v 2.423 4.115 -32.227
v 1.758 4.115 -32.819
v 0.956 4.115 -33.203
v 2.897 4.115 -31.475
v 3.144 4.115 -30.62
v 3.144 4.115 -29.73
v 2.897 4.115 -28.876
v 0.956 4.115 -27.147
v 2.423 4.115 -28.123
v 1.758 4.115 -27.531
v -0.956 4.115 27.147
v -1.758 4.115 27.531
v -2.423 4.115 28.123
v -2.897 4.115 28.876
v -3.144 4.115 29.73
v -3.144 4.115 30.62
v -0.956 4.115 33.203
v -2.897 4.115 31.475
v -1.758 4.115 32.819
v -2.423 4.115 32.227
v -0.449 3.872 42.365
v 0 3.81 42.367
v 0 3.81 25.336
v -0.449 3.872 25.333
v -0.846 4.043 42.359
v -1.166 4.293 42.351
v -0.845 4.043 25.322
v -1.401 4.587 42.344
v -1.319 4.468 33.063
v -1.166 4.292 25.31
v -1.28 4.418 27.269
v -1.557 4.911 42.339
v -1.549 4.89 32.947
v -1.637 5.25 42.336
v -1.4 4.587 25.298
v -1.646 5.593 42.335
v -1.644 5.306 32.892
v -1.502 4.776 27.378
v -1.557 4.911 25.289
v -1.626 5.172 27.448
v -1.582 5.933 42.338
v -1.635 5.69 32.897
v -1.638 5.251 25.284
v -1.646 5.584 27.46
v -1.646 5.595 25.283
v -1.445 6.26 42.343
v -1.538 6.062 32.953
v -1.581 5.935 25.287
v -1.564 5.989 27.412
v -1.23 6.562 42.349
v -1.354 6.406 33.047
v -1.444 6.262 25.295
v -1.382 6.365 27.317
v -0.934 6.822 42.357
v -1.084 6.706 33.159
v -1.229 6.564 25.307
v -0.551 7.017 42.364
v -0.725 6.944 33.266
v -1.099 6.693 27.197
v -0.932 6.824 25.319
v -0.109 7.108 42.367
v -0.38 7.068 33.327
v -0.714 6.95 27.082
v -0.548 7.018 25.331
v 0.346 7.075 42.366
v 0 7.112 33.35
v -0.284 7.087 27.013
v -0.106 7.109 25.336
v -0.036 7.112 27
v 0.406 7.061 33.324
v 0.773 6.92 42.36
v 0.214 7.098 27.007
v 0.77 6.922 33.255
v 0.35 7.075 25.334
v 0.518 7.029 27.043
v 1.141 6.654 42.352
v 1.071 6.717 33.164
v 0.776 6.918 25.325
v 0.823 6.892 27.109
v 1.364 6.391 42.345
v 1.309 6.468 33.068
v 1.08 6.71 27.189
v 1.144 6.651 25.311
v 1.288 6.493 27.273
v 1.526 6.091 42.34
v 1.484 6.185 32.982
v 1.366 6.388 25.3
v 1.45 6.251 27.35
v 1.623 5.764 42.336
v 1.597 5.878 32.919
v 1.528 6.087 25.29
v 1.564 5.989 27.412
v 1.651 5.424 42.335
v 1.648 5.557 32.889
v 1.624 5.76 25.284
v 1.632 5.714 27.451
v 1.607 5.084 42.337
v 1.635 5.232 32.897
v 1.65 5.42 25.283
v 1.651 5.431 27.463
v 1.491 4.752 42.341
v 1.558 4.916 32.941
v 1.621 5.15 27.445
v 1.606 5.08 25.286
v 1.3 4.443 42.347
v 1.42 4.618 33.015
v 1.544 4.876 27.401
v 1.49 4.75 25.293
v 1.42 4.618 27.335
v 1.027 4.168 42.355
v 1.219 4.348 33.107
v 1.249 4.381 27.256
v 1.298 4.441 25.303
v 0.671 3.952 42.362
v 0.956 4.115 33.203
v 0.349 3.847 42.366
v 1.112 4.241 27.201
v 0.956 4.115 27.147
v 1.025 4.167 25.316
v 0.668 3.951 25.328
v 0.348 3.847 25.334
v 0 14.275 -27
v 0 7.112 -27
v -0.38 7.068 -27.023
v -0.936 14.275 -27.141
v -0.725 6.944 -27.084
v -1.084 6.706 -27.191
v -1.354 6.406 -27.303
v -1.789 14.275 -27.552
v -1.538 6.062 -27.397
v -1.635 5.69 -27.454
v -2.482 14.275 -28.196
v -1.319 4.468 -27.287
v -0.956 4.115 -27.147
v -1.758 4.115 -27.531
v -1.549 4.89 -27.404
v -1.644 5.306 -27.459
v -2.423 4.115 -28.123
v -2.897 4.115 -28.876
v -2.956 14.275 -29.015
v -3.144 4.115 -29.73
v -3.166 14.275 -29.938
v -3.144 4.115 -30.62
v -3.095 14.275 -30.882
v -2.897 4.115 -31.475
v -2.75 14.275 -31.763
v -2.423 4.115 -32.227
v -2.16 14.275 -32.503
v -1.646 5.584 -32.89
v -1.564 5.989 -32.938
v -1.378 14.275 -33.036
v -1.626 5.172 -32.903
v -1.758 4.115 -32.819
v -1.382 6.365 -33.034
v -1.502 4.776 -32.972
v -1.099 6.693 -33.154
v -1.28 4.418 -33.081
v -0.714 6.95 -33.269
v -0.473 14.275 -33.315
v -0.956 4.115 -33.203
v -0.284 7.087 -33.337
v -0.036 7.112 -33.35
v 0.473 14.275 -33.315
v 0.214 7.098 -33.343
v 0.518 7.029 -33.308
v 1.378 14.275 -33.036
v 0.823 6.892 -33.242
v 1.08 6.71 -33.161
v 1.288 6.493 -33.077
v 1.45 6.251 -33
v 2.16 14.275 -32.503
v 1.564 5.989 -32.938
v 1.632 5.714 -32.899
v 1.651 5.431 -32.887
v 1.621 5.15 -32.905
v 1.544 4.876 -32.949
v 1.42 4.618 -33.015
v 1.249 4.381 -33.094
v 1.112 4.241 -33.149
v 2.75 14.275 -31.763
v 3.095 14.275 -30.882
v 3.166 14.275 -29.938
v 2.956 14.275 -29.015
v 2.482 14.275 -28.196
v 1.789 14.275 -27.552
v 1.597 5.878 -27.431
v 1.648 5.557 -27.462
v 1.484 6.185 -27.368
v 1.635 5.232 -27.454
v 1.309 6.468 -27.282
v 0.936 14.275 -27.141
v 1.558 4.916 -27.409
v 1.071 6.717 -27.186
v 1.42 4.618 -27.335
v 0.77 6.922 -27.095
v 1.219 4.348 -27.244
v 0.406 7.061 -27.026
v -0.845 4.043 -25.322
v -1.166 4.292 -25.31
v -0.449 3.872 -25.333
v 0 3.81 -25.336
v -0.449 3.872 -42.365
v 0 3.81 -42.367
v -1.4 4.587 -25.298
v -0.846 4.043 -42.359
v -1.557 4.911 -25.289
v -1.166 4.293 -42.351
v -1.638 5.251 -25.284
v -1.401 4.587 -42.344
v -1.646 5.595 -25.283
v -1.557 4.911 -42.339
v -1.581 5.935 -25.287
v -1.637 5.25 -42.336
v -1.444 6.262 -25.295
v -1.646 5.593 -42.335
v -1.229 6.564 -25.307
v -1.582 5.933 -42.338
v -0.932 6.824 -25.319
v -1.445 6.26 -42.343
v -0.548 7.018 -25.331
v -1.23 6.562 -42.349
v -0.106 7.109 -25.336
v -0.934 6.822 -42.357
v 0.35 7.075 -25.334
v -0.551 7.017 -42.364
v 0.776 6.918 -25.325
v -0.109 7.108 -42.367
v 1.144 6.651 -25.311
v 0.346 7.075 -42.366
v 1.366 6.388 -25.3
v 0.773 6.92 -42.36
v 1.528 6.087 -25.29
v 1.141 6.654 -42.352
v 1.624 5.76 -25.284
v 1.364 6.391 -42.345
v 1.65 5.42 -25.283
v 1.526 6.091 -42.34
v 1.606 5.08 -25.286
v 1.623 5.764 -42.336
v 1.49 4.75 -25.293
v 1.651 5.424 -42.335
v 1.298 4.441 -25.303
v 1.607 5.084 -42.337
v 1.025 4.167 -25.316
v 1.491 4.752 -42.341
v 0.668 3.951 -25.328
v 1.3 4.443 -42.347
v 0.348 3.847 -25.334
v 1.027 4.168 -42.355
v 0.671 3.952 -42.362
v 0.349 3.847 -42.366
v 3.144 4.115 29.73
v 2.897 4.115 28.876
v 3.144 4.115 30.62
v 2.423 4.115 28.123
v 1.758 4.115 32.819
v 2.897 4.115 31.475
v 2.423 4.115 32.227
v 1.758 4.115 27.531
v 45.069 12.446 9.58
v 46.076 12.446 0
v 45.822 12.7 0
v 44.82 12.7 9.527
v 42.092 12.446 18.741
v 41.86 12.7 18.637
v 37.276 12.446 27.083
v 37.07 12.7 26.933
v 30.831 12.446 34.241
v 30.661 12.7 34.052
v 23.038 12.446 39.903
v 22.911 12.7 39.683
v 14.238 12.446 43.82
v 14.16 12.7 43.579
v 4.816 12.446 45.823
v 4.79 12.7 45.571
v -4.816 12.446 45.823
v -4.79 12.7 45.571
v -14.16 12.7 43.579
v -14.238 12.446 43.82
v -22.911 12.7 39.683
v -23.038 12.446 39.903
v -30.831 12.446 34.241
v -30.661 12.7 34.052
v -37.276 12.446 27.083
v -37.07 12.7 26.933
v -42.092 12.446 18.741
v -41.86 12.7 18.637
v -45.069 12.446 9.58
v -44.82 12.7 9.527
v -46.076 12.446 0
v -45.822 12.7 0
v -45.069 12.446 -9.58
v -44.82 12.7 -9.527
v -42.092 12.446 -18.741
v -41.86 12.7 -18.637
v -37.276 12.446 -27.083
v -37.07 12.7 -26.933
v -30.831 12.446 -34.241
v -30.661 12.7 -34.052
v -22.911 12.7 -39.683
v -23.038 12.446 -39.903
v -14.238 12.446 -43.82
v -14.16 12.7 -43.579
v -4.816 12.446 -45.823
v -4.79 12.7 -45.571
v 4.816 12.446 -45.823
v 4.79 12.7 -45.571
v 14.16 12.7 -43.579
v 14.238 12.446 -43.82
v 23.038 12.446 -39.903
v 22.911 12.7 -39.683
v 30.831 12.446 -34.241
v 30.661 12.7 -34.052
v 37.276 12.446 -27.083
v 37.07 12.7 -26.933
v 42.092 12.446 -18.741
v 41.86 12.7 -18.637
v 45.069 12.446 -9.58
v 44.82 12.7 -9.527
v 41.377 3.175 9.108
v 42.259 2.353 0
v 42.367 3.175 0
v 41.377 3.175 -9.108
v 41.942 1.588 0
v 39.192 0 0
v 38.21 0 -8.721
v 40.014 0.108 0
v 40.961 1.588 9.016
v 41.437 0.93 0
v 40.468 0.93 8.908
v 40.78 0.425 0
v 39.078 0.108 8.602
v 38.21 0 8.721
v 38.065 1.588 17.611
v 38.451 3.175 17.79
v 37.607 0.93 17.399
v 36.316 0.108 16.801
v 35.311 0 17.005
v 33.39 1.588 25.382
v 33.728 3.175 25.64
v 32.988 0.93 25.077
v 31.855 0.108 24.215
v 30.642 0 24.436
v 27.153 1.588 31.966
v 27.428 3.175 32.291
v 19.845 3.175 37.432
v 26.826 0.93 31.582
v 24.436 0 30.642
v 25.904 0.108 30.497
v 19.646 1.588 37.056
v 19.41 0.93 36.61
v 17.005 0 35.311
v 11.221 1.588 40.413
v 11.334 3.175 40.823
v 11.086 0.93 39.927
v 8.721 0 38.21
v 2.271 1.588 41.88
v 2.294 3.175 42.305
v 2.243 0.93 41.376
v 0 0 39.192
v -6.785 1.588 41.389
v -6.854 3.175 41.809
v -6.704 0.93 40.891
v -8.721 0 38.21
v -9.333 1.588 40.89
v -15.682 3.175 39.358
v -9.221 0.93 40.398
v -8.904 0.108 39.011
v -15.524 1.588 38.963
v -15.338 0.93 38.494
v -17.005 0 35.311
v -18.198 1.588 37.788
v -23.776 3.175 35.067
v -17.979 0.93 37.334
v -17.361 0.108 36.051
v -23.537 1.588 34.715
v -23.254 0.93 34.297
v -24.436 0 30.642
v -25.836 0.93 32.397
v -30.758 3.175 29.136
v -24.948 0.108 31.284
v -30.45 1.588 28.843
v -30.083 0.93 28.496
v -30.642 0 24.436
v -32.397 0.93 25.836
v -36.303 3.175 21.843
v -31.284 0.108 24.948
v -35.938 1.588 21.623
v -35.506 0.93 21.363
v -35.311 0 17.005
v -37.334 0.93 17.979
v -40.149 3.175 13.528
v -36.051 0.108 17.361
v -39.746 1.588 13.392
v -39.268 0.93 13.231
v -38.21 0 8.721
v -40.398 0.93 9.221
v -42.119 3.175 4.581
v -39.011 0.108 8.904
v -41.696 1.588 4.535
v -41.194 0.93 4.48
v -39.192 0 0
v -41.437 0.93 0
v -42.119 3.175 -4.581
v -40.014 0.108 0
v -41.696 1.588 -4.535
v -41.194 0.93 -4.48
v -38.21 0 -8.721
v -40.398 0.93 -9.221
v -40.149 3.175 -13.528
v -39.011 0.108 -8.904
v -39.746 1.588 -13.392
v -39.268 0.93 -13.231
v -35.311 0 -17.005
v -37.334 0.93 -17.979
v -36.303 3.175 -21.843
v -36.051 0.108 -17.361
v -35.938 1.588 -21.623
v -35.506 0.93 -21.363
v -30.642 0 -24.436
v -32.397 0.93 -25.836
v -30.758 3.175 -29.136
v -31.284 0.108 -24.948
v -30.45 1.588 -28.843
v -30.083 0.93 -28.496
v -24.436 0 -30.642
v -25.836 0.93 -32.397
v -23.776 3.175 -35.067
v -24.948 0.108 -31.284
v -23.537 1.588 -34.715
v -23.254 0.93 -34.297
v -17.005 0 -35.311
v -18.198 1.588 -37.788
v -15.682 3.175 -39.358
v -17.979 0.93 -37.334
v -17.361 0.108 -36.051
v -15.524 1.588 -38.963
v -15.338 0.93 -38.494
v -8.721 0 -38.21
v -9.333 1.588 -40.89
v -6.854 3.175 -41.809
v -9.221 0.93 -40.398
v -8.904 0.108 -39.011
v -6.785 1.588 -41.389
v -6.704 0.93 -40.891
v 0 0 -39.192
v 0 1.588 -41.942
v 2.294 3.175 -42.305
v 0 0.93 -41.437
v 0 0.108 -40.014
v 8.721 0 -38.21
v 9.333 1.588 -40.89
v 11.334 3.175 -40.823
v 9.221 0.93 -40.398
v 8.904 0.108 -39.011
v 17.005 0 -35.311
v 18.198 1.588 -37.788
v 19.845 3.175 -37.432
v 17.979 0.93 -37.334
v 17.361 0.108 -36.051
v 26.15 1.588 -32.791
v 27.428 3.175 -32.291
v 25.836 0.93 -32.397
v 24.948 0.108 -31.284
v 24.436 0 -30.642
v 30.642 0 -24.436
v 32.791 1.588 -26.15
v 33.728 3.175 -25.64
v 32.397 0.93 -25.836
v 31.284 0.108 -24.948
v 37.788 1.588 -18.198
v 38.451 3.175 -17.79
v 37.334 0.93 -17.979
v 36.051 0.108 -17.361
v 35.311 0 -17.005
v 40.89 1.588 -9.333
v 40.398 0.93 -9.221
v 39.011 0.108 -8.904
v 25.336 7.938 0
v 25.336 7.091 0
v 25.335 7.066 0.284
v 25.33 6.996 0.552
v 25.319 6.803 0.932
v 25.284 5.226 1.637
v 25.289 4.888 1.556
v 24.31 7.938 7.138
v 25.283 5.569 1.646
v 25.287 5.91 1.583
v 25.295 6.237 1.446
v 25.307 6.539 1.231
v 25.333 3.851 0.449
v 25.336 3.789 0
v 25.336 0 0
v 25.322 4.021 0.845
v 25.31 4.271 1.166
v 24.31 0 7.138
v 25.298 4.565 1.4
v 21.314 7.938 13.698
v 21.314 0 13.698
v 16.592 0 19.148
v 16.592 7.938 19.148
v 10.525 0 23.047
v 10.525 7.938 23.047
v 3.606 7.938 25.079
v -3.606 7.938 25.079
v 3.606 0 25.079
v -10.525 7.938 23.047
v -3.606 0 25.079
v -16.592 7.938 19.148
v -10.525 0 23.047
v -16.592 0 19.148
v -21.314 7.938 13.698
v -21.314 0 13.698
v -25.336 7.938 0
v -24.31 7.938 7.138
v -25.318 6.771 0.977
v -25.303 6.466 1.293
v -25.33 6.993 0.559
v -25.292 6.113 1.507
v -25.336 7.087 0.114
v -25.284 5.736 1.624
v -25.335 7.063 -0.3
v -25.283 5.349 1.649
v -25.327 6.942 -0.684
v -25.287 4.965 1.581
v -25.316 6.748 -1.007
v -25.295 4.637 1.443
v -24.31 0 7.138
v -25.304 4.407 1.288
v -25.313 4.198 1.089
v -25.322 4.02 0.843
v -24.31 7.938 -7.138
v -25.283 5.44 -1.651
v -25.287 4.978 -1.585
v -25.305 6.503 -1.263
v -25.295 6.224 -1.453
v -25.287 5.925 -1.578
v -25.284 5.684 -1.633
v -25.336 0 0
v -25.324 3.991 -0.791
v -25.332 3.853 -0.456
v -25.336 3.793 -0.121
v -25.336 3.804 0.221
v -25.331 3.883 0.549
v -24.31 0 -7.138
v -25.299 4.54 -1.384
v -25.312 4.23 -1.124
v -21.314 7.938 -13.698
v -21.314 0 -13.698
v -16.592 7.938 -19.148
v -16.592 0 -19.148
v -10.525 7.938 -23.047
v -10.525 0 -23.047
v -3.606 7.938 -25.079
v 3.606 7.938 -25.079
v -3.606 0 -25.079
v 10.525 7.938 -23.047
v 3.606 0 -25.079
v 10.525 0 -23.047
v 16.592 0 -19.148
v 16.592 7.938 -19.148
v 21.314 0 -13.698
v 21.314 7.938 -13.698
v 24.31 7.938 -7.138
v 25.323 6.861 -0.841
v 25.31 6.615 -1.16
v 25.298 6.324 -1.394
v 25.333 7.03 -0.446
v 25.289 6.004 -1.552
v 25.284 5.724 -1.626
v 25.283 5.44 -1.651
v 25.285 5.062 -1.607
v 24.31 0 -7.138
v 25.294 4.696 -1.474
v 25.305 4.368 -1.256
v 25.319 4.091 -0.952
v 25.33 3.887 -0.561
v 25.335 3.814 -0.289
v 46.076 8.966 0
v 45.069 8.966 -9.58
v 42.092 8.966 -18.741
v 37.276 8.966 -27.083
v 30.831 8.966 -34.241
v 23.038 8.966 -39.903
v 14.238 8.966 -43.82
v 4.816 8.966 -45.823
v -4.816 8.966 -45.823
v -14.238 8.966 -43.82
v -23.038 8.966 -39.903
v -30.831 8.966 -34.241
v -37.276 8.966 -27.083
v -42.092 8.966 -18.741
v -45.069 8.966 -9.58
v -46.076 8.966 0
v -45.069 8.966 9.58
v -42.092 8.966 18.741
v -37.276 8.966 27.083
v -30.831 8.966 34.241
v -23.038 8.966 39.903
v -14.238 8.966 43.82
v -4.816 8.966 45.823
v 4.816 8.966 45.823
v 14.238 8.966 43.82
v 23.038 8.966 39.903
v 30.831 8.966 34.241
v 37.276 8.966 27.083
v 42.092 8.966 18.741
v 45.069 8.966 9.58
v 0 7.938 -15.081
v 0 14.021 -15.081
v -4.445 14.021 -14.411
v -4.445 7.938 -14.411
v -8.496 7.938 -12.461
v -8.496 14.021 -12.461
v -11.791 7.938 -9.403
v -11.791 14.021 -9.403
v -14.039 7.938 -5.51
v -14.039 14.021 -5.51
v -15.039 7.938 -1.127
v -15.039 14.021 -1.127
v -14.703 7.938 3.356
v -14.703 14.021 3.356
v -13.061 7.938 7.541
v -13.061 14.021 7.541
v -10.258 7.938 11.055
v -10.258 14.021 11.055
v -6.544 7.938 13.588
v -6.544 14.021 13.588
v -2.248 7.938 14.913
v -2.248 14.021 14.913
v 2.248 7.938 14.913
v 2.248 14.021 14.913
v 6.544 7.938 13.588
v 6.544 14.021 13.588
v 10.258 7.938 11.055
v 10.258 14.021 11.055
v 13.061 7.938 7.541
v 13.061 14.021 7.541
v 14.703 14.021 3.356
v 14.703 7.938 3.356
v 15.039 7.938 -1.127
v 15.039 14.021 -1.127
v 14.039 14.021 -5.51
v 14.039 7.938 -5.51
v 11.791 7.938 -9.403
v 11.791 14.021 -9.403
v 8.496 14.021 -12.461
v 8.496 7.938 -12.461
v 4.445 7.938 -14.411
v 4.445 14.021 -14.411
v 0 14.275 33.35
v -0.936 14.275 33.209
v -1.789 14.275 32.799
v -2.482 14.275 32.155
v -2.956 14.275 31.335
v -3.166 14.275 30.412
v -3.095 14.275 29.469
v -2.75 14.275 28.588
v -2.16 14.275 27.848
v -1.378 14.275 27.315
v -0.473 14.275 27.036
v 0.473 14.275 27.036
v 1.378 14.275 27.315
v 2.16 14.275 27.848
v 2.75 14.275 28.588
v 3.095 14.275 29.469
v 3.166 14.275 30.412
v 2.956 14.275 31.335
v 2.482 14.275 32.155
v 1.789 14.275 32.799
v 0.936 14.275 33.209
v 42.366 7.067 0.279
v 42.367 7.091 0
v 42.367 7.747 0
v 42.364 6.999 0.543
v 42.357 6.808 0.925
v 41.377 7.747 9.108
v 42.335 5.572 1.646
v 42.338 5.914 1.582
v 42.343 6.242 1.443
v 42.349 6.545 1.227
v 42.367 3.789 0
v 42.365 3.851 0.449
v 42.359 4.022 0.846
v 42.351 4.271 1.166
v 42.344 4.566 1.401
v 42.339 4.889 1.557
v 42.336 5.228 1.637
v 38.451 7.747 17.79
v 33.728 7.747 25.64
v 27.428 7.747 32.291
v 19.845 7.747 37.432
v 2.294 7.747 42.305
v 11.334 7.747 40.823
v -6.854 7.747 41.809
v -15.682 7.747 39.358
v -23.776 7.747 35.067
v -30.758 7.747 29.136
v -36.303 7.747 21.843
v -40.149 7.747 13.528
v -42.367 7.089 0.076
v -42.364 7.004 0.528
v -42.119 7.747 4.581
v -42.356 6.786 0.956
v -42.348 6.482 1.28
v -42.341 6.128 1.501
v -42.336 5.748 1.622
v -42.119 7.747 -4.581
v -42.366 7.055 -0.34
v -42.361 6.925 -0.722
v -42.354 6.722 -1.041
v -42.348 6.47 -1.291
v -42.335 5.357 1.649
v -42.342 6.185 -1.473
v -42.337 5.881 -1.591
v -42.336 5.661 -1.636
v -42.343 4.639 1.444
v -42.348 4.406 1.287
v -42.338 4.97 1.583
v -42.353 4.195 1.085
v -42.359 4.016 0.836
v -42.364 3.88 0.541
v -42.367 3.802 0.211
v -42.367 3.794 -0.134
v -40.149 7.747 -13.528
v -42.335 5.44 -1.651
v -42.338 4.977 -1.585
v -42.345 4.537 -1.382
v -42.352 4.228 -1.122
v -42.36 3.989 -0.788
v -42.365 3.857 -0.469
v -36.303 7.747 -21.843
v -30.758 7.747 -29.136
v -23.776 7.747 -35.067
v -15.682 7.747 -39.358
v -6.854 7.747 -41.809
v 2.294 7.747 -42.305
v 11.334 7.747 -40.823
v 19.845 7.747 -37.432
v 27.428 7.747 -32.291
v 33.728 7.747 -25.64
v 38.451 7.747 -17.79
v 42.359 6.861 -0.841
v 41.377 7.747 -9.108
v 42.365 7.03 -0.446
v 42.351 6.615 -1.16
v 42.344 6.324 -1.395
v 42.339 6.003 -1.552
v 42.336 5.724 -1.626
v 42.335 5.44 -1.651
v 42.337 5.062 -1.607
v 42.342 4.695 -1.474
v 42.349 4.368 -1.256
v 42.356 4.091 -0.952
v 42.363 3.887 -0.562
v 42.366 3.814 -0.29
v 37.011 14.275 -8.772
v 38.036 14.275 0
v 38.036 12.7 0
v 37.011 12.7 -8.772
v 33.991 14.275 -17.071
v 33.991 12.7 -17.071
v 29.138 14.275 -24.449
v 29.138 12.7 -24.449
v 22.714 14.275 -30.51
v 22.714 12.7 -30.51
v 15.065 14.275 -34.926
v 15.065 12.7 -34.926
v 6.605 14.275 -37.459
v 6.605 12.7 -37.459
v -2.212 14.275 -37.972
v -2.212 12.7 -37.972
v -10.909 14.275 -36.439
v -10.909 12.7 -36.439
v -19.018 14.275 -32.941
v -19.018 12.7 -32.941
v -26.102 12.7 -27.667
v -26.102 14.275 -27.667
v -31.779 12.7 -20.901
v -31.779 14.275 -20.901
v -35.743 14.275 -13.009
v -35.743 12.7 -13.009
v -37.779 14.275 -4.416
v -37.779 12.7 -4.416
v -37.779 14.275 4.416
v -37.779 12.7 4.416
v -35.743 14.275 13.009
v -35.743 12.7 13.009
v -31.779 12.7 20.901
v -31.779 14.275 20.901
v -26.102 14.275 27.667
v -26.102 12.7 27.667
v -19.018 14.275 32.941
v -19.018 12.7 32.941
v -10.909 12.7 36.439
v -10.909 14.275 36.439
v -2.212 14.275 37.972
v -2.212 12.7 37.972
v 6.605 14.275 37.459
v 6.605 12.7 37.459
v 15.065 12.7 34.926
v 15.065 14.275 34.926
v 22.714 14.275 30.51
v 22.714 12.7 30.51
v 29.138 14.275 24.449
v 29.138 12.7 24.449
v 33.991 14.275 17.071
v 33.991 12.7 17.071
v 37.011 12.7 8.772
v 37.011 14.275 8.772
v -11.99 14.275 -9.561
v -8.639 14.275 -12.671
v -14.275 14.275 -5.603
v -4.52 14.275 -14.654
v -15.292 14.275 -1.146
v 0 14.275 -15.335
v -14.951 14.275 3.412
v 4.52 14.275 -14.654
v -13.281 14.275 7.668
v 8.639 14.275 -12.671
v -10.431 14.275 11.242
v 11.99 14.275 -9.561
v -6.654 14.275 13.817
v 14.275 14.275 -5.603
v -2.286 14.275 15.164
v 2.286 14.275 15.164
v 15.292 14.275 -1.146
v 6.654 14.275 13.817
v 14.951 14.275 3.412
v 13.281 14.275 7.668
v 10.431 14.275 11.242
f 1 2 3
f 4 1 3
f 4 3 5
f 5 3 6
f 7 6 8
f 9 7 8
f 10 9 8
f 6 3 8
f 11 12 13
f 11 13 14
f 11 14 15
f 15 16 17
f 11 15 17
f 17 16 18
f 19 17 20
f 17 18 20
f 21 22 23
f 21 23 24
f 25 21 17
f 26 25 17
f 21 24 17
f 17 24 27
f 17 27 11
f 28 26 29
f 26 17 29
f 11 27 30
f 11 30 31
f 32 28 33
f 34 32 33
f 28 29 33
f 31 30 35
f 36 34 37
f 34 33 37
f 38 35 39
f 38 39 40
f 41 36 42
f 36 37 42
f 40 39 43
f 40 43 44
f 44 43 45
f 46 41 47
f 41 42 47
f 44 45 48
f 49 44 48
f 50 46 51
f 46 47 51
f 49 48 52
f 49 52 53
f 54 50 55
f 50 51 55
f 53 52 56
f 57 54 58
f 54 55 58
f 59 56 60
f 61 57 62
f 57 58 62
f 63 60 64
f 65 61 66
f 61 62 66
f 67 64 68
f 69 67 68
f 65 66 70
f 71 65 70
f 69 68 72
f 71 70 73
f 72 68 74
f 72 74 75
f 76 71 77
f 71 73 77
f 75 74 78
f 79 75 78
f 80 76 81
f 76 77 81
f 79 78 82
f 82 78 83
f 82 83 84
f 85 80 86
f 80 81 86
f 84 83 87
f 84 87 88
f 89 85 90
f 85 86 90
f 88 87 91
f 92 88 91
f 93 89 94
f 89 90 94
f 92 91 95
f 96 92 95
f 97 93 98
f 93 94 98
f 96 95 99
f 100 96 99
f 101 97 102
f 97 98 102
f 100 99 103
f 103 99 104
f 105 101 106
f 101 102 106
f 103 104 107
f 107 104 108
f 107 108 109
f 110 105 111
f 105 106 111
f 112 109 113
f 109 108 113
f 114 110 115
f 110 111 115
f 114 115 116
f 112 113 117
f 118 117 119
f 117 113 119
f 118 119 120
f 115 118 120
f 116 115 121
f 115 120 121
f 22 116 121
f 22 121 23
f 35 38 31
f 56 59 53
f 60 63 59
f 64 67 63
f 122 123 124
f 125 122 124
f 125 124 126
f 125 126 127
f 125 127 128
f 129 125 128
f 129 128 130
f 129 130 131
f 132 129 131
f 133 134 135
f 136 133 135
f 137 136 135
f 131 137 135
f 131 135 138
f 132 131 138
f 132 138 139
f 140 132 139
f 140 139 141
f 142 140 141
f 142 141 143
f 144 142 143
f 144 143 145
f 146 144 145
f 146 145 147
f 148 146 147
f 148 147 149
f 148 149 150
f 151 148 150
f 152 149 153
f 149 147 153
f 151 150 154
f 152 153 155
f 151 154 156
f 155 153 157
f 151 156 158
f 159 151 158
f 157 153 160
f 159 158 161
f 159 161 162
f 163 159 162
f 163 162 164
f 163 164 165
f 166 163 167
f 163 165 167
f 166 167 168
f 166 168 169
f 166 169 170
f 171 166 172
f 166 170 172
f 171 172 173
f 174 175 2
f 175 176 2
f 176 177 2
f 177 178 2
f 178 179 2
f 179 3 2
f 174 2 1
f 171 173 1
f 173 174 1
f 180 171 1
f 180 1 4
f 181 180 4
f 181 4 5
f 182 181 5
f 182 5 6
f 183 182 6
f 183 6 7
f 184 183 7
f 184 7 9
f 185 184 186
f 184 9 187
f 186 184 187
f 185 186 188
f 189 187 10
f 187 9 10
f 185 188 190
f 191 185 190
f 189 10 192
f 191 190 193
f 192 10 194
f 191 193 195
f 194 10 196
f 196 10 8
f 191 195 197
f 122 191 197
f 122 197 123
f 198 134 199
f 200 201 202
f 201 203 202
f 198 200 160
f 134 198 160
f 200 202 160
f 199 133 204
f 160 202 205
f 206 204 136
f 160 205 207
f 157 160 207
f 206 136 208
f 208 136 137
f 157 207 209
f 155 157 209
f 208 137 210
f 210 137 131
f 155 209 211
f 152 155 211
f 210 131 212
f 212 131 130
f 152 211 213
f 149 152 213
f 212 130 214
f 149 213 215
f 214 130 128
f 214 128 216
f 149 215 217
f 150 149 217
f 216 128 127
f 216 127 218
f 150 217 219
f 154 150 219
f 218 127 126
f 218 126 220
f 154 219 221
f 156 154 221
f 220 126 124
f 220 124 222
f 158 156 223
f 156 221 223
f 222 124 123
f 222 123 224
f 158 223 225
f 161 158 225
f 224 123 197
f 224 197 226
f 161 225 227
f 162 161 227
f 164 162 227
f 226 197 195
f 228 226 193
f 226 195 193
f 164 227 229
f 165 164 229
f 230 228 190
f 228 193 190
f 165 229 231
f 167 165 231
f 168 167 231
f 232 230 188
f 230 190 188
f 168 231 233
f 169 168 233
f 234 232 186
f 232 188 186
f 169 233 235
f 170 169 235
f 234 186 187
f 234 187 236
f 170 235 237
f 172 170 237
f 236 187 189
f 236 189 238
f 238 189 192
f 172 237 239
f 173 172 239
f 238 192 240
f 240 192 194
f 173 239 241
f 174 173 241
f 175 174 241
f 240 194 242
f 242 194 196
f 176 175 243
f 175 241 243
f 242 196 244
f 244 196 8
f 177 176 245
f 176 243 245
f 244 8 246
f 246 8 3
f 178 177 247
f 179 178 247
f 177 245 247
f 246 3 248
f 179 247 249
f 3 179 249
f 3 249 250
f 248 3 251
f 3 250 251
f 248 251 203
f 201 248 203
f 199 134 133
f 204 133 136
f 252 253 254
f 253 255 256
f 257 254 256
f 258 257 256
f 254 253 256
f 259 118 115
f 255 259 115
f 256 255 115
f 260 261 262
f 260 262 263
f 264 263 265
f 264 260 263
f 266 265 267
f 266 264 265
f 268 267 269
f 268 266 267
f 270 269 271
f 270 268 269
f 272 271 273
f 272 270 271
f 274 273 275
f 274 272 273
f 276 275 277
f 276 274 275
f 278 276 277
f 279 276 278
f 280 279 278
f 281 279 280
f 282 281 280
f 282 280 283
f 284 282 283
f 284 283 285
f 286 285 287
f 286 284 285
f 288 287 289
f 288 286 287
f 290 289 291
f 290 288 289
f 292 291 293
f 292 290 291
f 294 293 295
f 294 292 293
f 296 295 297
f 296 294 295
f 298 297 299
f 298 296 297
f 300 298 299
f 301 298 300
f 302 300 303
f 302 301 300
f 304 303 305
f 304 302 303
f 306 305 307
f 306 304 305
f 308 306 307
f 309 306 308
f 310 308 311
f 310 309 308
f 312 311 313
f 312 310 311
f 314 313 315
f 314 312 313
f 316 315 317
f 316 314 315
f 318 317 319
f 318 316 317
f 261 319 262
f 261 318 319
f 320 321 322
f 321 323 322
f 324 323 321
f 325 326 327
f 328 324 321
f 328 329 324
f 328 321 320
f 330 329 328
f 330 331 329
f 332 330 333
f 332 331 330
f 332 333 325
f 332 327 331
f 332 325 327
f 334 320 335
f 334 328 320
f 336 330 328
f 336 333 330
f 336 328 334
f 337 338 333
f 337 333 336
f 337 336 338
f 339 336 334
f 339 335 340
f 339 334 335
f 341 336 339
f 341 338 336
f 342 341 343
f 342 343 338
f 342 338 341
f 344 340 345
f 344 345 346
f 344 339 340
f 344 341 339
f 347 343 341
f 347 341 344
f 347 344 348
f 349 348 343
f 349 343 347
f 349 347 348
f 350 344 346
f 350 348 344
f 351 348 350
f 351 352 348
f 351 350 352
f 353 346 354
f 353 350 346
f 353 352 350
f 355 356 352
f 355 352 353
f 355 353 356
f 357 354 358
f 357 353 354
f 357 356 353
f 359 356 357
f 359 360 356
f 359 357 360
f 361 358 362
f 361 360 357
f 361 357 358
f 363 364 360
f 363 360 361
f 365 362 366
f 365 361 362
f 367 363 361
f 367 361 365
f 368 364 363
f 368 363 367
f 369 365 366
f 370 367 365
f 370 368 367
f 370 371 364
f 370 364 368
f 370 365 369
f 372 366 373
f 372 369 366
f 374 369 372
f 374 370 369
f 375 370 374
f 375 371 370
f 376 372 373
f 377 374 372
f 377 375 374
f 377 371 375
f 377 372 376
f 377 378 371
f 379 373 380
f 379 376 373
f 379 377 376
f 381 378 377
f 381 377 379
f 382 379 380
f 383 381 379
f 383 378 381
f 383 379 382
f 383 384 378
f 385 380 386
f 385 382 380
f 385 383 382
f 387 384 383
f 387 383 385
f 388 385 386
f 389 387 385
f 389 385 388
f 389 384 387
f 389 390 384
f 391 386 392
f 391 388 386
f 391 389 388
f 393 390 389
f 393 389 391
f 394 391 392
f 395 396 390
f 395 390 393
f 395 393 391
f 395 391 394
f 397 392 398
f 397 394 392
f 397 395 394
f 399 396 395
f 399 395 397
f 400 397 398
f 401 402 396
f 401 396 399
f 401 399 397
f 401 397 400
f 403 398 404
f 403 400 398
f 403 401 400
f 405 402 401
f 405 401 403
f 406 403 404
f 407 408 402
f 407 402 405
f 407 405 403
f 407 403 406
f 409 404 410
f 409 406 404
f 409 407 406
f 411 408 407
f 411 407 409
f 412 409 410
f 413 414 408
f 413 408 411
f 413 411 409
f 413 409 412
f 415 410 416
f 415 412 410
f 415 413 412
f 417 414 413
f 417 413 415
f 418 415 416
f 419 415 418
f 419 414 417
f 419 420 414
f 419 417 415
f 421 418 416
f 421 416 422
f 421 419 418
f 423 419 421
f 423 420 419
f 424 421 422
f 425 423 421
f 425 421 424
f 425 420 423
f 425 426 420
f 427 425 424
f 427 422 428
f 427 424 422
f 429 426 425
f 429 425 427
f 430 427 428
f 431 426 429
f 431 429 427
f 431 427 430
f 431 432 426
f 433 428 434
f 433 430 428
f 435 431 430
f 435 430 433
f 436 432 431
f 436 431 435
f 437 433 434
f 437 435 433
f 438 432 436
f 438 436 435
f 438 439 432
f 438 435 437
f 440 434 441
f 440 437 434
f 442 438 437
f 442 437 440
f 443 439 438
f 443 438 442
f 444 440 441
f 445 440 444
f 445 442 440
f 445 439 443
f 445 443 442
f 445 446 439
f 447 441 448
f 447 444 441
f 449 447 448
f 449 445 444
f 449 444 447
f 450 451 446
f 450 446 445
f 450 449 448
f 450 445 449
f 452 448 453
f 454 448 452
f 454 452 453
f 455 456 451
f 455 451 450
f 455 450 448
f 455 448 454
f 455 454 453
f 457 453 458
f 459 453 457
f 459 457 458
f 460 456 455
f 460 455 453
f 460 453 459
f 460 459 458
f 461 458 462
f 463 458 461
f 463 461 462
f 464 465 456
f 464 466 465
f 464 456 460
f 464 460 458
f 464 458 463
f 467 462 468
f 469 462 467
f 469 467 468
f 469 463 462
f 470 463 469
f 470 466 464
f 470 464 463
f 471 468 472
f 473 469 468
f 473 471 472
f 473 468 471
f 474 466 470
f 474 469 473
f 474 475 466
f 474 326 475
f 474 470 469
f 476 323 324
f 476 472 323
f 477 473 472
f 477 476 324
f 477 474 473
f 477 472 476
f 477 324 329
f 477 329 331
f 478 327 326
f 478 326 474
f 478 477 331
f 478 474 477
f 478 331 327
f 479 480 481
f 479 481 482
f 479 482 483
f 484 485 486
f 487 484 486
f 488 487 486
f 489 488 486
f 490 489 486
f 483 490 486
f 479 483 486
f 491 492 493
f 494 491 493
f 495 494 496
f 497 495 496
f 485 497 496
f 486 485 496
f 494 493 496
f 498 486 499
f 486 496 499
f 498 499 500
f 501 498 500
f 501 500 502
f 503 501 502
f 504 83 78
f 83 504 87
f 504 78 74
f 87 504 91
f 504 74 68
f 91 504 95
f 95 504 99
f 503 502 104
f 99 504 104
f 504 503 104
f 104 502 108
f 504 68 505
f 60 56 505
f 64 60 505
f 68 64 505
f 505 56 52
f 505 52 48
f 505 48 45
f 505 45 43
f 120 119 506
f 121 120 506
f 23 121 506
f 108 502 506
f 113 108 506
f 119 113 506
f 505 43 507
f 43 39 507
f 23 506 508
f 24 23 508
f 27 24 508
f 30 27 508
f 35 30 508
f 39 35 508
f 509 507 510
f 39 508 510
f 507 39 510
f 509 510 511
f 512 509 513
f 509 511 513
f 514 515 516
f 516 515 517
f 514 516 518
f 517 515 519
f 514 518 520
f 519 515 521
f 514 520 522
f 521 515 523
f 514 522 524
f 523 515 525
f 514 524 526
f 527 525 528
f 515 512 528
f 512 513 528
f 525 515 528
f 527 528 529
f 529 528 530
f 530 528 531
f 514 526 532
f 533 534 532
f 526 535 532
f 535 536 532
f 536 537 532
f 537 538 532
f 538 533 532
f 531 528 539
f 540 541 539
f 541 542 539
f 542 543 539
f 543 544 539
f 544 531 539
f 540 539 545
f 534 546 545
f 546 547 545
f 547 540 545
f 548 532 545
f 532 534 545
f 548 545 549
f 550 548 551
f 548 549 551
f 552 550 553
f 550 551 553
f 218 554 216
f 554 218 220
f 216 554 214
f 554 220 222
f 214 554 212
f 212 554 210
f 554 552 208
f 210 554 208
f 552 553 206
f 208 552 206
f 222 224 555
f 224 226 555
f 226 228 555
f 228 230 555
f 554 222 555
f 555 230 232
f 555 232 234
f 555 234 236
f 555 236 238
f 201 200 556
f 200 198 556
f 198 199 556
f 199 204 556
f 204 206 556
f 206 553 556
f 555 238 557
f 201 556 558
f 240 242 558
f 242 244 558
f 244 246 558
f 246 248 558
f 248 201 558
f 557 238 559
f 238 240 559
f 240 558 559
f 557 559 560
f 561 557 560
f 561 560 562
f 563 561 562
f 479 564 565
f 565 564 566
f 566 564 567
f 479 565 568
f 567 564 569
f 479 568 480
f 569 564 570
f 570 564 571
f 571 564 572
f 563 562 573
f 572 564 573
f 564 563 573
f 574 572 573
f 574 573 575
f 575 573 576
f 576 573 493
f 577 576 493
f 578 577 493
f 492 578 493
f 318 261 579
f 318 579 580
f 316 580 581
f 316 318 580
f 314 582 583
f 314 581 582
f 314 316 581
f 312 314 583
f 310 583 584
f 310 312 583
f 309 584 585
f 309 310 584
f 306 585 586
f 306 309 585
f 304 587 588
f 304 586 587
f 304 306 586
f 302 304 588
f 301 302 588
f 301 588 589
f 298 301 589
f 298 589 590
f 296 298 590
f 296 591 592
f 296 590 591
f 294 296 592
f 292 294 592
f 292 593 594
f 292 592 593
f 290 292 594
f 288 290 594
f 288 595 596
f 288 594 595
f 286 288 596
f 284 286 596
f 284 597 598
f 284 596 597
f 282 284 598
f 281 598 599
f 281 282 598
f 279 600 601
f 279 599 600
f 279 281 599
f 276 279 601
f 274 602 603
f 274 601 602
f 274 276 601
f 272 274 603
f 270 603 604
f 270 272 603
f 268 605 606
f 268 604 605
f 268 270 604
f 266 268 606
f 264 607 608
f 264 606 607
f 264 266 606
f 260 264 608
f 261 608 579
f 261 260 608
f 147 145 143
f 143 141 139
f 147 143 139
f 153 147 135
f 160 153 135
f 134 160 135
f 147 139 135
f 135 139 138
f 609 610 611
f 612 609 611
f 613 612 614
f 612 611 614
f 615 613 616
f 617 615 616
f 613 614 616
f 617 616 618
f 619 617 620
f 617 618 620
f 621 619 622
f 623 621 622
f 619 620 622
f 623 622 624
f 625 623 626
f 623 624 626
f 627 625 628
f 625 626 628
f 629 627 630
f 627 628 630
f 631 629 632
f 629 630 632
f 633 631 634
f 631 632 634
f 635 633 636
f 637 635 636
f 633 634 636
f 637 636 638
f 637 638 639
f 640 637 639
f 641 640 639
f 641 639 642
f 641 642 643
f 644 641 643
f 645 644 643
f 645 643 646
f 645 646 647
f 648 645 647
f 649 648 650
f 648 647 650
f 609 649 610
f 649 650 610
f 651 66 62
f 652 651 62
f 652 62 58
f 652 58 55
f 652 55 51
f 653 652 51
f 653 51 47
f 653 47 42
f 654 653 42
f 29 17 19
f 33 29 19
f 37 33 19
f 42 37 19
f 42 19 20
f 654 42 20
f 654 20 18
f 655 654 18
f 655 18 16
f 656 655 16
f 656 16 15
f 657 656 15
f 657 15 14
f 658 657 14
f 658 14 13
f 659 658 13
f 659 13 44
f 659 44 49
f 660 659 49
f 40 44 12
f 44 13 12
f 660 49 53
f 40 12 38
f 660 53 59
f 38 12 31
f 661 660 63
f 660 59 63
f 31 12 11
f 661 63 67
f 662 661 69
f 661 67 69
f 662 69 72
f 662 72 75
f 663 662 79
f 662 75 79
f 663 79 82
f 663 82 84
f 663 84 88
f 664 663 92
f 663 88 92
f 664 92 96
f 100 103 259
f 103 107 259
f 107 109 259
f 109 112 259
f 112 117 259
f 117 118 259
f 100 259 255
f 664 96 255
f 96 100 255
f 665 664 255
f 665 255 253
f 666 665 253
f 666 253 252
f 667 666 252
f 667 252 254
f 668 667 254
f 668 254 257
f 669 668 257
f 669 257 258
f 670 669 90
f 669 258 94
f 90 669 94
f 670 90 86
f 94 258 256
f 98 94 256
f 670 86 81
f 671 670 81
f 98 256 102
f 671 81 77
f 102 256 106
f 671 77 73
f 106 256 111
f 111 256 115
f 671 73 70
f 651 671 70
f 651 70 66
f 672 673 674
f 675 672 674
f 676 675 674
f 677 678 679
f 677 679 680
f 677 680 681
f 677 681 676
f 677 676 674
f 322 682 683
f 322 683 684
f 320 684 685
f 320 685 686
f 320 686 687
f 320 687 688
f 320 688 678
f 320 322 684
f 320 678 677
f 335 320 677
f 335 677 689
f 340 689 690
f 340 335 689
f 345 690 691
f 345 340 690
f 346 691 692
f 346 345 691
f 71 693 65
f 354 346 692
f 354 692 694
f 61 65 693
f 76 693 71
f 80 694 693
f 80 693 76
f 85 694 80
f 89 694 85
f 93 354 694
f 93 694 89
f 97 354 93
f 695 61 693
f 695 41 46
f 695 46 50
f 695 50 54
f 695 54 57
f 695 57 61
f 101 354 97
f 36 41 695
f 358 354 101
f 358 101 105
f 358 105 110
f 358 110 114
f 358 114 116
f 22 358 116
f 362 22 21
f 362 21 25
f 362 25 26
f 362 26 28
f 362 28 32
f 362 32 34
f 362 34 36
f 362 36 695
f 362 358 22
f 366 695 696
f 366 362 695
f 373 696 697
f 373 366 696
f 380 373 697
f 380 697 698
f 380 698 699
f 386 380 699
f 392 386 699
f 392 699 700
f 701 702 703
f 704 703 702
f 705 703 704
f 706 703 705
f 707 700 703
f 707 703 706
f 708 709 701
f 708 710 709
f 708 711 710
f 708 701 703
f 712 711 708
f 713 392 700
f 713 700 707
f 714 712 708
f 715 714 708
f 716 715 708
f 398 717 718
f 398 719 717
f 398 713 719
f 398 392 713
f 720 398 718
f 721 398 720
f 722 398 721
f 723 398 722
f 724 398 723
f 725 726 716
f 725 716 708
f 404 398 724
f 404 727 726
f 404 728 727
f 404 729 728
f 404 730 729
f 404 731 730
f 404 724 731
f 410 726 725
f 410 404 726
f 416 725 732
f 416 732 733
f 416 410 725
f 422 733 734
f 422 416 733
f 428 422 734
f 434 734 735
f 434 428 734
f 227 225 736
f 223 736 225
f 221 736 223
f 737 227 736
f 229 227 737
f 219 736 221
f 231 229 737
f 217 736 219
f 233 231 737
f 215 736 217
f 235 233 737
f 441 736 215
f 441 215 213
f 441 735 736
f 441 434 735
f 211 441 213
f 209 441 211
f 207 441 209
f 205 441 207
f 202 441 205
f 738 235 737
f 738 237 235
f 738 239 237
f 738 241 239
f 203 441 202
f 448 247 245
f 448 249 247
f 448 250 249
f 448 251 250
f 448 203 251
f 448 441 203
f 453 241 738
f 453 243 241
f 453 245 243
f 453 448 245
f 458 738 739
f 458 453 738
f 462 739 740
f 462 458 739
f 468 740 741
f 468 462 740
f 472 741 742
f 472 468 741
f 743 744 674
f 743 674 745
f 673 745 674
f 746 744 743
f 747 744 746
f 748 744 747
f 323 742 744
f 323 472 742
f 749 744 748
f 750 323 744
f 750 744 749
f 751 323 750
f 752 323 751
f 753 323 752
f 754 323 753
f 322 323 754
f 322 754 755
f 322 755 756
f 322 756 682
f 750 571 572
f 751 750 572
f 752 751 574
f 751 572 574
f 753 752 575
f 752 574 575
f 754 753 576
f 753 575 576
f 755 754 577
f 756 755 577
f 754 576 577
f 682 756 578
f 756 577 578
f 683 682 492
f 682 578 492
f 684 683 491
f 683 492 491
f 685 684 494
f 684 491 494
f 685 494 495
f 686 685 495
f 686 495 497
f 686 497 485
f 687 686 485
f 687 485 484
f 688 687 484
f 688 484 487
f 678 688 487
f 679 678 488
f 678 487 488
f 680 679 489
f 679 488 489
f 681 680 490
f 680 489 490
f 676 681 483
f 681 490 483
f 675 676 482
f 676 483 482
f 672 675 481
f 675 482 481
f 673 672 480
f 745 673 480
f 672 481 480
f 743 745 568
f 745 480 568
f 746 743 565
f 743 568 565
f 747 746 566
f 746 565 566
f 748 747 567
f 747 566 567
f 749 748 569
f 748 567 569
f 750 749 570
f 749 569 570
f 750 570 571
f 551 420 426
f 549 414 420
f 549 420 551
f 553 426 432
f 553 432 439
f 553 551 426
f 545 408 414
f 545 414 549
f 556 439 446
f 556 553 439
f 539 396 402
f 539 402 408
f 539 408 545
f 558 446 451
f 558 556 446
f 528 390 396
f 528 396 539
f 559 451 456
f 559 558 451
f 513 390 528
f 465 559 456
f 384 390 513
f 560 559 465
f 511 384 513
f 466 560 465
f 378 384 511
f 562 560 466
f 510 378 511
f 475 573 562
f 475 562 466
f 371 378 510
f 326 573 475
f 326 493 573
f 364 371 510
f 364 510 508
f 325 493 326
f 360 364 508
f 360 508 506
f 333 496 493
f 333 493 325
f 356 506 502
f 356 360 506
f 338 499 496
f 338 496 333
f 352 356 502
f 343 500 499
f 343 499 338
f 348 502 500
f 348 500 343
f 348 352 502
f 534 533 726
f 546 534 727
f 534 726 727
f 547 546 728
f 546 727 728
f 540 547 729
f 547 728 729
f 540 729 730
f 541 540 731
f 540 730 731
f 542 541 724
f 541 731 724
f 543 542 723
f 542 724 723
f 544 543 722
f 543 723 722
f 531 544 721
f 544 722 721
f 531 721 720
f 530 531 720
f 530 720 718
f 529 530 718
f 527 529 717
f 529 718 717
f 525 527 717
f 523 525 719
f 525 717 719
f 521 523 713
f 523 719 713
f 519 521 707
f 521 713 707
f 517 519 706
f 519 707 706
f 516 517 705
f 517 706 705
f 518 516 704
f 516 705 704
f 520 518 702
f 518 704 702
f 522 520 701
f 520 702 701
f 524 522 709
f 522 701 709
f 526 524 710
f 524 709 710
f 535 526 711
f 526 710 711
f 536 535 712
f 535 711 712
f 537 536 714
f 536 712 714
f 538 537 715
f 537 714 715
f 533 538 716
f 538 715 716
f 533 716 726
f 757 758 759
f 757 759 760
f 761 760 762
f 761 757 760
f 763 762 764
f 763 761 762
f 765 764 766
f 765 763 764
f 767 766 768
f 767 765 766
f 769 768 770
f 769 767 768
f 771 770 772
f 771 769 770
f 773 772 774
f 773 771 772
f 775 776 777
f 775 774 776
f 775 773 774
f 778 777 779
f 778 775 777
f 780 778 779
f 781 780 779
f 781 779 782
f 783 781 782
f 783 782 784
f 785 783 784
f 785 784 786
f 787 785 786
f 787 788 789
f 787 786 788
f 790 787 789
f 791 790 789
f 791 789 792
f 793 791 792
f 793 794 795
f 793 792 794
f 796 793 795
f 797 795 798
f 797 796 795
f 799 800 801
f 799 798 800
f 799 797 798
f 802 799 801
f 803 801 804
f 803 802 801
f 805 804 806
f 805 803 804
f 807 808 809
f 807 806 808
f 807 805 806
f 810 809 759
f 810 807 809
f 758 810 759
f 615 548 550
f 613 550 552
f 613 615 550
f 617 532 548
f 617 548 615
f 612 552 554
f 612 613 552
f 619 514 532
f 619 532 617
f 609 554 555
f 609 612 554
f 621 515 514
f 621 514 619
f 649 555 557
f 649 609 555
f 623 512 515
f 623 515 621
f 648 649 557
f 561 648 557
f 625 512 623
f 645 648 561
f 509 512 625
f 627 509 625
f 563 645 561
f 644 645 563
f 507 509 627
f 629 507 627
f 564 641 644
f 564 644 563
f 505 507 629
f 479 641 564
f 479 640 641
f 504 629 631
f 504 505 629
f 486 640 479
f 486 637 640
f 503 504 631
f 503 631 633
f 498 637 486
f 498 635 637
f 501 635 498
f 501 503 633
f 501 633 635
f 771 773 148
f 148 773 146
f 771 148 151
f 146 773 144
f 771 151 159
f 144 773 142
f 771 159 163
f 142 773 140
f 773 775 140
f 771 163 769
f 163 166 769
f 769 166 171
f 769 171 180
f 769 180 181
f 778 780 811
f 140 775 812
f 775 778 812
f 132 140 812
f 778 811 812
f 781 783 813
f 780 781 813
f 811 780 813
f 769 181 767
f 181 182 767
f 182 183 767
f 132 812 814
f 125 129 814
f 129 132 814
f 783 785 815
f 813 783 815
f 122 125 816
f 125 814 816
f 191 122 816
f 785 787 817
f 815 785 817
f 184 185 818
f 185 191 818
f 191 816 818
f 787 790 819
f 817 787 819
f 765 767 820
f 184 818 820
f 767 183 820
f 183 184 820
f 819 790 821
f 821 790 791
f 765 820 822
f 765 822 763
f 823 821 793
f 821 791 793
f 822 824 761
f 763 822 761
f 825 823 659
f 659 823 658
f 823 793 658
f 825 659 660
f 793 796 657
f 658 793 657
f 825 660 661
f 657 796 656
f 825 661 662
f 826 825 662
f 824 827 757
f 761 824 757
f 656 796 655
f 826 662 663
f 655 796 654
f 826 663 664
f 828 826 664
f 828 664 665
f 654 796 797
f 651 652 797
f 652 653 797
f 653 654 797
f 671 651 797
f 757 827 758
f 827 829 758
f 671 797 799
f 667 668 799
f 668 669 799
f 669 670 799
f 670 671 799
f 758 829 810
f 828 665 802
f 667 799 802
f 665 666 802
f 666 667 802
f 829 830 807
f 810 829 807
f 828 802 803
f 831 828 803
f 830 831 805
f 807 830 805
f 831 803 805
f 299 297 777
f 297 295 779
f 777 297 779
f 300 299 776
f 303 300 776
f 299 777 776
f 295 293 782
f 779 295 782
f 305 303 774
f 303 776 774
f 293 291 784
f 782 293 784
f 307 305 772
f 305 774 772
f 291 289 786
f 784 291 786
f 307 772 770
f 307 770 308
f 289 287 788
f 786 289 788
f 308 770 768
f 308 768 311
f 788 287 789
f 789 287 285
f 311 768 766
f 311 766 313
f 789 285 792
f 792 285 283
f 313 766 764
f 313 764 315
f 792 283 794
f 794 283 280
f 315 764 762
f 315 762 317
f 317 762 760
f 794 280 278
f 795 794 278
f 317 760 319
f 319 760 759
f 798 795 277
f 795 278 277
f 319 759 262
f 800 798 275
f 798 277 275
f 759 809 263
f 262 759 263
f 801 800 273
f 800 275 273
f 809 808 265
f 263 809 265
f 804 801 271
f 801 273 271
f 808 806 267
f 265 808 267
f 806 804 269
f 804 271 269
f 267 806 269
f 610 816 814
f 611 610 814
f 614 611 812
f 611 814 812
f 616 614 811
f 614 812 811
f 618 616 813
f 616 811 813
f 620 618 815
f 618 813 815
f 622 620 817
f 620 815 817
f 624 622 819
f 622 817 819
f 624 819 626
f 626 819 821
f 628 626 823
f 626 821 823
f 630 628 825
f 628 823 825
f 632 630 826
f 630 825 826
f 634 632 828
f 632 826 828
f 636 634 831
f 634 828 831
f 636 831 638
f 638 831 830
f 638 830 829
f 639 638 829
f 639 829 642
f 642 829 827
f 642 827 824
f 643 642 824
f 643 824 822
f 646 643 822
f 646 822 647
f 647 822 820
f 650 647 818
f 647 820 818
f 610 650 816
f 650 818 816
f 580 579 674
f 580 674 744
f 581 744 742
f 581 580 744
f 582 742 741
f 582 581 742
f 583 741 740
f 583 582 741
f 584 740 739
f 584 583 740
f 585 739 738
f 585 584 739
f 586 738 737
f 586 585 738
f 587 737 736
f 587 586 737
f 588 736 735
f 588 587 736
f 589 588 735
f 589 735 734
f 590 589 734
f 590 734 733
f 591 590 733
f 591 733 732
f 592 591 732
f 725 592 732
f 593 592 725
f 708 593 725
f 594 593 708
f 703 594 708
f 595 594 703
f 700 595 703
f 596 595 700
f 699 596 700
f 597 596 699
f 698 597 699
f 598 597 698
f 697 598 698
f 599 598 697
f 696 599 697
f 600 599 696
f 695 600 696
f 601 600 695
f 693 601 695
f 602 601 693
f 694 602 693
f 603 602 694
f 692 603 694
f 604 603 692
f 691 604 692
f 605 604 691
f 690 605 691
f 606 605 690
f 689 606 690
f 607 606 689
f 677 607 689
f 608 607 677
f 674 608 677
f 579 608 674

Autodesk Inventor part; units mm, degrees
sketch "Sketch1" plane through (0, 0, 0) normal (0, 0, 1) x (1, 0, 0)
  line L0 (17.5514, 0) -> (46.0756, 0)
  line L1 (46.0756, 0) -> (46.0756, 12.7)
  line L2 (46.0756, 12.7) -> (0, 12.7)
  line L3 (0, 12.7) -> (0, 0)
  line L4 (17.5514, 12.7) -> (17.5514, 0)
  line L5 (46.0756, 8.9662) -> (42.3672, 8.9662)
  line L6 (42.3672, 7.747) -> (42.3672, 0)
  line L7 (46.0756, 7.747) -> (42.3672, 7.747)
  line L8 (46.0756, 8.9662) -> (42.3672, 7.747)
  line L9 (0, 11.1252) -> (0, 12.7)
  line L10 (17.5514, 0) -> (23.85, 0)
  line L11 (0, -2.5) -> (0, 0)
  line L12 (0, 12.7) -> (38.0365, 12.7)
  line L13 (38.0365, 12.7) -> (38.0365, 14.2748)
  line L14 (38.0365, 14.2748) -> (0, 14.2748)
  line L15 (0, 14.2748) -> (0, 12.7)
  line L16 (17.5514, 12.7) -> (17.5514, 14.2748)
  line L17 (0, 0) -> (17.5514, 0)
  dimension "d1" = 12.7
  dimension "d3" = 3.7338
  dimension "d5" = 4.953
  dimension "d8" = 17.5514
  dimension "d9" = 42.3672
  dimension "d10" = 46.0756
  dimension "d11" = 1.5748
  dimension "d12" = 38.0365
revolve "Revolution1" add sketch "Sketch1" angle 360 about axis through (0, 12.7, 0) along (0, -1, 0) contours L4 L2 L1 L8 L6 L0 | L17 L3 L2 L4 | L16 L14 L13 L2 | L2 L15 L14 L16
sketch "Sketch2" plane through (0, 14.2748, 0) normal (0, 1, 0) x (1, 0, 0)
  circle A0 centre (0, 0) radius 30.1752
  point P0 (0, 30.1752)
  point P1 (0, -30.1752)
  dimension "d14" = 60.3504
hole "Hole1" at (0, 14.2748, -30.1752) at (0, 14.2748, 30.1752) direction (0, -1, 0) diameter 6.35 depth 10.16
fillet "Fillet1" radius 3.175 1 edges at (-42.3672, 0, 0)
sketch "Sketch3" plane through (0, 0, 0) normal (0, -1, 0) x (1, 0, 0)
  circle A0 centre (0, 0) radius 25.3365
  dimension "d23" = 50.673
extrude "Extrusion1" cut sketch "Sketch3" against normal blind 7.9375
sketch "Sketch5" plane through (0, 7.9375, 0) normal (0, -1, 0) x (1, 0, 0)
  line L0 (42.3672, -42.3672) -> (42.3672, 42.3672)
  line L1 (42.3672, 42.3672) -> (-42.3672, 42.3672)
  line L2 (-42.3672, 42.3672) -> (-42.3672, -42.3672)
  line L3 (-42.3672, -42.3672) -> (42.3672, -42.3672)
  line L4 (42.3672, -42.3672) -> (-42.3672, 42.3672) construction
  line L5 (42.3672, 42.3672) -> (-42.3672, -42.3672) construction
  point P0 (0, 0)
sketch "Sketch6" plane through (0, 0, 0) normal (1, 0, 0) x (0, 1, 0)
  point P0 (0, 0)
ref_plane "Work Plane1" through (42.6466, 0, 0) normal (1, 0, 0) x (0, 1, 0)
sketch "Sketch7" plane through (42.6466, 0, 0) normal (1, 0, 0) x (0, 1, 0)
  line L0 (3.175, 42.3672) -> (3.175, -42.3672) projected
  line L1 (3.175, 0) -> (7.7045, 0)
  point P0 (0, 0)
  point P1 (5.4398, 0)
ref_plane "Work Plane2" through (-42.6466, 0, 0) normal (1, 0, 0) x (0, 1, 0)
sketch "Sketch9" plane through (-42.6466, 0, 0) normal (1, 0, 0) x (0, 1, 0)
  line L0 (3.175, 42.3672) -> (3.175, -42.3672) projected
  line L1 (3.175, 0) -> (7.747, 0)
  line L2 (7.747, 42.3672) -> (7.747, -42.3672) projected
  point P0 (0, 0)
  point P1 (5.461, 0)
ref_plane "Work Plane3" through (0, 0, -42.6466) normal (0, 0, 1) x (1, 0, 0)
sketch "Sketch10" plane through (0, 0, -42.6466) normal (0, 0, 1) x (1, 0, 0)
  line L0 (-42.3672, 7.747) -> (42.3672, 7.747) projected
  line L1 (0, 7.747) -> (0, 3.175)
  line L2 (-42.3672, 3.175) -> (42.3672, 3.175) projected
  point P0 (0, 0)
  point P1 (0, 5.461)
ref_plane "Work Plane4" through (0, 0, 42.6466) normal (0, 0, 1) x (1, 0, 0)
sketch "Sketch11" plane through (0, 0, 42.6466) normal (0, 0, 1) x (1, 0, 0)
  line L0 (-42.3672, 3.175) -> (42.3672, 3.175) projected
  line L1 (0, 3.175) -> (0, 7.747)
  line L2 (-42.3672, 7.747) -> (42.3672, 7.747) projected
  point P0 (0, 0)
  point P1 (0, 5.461)
hole "Hole2" at (-42.6466, 5.461, 0) direction (-1, 0, 0) diameter 3.302 end through all thread size "8-32 UNC" class "2B" standard "ANSI Unified Screw Threads"
hole "Hole3" at (42.6466, 5.4398, 0) direction (-1, 0, 0) diameter 3.302 end through all thread size "8-32 UNC" class "2B" standard "ANSI Unified Screw Threads"
hole "Hole4" at (0, 5.461, 42.6466) direction (0, 0, -1) diameter 3.302 end through all thread size "8-32 UNC" class "2B" standard "ANSI Unified Screw Threads"
hole "Hole5" at (0, 7.9375, 0) direction (0, 1, 0) diameter 30.1625 end through all
chamfer "Chamfer1" distance 0.254 angle 45 2 edges at (-46.0756, 12.7, 0) (0, 14.2748, 15.0812)
properties part number "2016.06.09 Judson M204 Adapter" material "Aluminum 6061"
